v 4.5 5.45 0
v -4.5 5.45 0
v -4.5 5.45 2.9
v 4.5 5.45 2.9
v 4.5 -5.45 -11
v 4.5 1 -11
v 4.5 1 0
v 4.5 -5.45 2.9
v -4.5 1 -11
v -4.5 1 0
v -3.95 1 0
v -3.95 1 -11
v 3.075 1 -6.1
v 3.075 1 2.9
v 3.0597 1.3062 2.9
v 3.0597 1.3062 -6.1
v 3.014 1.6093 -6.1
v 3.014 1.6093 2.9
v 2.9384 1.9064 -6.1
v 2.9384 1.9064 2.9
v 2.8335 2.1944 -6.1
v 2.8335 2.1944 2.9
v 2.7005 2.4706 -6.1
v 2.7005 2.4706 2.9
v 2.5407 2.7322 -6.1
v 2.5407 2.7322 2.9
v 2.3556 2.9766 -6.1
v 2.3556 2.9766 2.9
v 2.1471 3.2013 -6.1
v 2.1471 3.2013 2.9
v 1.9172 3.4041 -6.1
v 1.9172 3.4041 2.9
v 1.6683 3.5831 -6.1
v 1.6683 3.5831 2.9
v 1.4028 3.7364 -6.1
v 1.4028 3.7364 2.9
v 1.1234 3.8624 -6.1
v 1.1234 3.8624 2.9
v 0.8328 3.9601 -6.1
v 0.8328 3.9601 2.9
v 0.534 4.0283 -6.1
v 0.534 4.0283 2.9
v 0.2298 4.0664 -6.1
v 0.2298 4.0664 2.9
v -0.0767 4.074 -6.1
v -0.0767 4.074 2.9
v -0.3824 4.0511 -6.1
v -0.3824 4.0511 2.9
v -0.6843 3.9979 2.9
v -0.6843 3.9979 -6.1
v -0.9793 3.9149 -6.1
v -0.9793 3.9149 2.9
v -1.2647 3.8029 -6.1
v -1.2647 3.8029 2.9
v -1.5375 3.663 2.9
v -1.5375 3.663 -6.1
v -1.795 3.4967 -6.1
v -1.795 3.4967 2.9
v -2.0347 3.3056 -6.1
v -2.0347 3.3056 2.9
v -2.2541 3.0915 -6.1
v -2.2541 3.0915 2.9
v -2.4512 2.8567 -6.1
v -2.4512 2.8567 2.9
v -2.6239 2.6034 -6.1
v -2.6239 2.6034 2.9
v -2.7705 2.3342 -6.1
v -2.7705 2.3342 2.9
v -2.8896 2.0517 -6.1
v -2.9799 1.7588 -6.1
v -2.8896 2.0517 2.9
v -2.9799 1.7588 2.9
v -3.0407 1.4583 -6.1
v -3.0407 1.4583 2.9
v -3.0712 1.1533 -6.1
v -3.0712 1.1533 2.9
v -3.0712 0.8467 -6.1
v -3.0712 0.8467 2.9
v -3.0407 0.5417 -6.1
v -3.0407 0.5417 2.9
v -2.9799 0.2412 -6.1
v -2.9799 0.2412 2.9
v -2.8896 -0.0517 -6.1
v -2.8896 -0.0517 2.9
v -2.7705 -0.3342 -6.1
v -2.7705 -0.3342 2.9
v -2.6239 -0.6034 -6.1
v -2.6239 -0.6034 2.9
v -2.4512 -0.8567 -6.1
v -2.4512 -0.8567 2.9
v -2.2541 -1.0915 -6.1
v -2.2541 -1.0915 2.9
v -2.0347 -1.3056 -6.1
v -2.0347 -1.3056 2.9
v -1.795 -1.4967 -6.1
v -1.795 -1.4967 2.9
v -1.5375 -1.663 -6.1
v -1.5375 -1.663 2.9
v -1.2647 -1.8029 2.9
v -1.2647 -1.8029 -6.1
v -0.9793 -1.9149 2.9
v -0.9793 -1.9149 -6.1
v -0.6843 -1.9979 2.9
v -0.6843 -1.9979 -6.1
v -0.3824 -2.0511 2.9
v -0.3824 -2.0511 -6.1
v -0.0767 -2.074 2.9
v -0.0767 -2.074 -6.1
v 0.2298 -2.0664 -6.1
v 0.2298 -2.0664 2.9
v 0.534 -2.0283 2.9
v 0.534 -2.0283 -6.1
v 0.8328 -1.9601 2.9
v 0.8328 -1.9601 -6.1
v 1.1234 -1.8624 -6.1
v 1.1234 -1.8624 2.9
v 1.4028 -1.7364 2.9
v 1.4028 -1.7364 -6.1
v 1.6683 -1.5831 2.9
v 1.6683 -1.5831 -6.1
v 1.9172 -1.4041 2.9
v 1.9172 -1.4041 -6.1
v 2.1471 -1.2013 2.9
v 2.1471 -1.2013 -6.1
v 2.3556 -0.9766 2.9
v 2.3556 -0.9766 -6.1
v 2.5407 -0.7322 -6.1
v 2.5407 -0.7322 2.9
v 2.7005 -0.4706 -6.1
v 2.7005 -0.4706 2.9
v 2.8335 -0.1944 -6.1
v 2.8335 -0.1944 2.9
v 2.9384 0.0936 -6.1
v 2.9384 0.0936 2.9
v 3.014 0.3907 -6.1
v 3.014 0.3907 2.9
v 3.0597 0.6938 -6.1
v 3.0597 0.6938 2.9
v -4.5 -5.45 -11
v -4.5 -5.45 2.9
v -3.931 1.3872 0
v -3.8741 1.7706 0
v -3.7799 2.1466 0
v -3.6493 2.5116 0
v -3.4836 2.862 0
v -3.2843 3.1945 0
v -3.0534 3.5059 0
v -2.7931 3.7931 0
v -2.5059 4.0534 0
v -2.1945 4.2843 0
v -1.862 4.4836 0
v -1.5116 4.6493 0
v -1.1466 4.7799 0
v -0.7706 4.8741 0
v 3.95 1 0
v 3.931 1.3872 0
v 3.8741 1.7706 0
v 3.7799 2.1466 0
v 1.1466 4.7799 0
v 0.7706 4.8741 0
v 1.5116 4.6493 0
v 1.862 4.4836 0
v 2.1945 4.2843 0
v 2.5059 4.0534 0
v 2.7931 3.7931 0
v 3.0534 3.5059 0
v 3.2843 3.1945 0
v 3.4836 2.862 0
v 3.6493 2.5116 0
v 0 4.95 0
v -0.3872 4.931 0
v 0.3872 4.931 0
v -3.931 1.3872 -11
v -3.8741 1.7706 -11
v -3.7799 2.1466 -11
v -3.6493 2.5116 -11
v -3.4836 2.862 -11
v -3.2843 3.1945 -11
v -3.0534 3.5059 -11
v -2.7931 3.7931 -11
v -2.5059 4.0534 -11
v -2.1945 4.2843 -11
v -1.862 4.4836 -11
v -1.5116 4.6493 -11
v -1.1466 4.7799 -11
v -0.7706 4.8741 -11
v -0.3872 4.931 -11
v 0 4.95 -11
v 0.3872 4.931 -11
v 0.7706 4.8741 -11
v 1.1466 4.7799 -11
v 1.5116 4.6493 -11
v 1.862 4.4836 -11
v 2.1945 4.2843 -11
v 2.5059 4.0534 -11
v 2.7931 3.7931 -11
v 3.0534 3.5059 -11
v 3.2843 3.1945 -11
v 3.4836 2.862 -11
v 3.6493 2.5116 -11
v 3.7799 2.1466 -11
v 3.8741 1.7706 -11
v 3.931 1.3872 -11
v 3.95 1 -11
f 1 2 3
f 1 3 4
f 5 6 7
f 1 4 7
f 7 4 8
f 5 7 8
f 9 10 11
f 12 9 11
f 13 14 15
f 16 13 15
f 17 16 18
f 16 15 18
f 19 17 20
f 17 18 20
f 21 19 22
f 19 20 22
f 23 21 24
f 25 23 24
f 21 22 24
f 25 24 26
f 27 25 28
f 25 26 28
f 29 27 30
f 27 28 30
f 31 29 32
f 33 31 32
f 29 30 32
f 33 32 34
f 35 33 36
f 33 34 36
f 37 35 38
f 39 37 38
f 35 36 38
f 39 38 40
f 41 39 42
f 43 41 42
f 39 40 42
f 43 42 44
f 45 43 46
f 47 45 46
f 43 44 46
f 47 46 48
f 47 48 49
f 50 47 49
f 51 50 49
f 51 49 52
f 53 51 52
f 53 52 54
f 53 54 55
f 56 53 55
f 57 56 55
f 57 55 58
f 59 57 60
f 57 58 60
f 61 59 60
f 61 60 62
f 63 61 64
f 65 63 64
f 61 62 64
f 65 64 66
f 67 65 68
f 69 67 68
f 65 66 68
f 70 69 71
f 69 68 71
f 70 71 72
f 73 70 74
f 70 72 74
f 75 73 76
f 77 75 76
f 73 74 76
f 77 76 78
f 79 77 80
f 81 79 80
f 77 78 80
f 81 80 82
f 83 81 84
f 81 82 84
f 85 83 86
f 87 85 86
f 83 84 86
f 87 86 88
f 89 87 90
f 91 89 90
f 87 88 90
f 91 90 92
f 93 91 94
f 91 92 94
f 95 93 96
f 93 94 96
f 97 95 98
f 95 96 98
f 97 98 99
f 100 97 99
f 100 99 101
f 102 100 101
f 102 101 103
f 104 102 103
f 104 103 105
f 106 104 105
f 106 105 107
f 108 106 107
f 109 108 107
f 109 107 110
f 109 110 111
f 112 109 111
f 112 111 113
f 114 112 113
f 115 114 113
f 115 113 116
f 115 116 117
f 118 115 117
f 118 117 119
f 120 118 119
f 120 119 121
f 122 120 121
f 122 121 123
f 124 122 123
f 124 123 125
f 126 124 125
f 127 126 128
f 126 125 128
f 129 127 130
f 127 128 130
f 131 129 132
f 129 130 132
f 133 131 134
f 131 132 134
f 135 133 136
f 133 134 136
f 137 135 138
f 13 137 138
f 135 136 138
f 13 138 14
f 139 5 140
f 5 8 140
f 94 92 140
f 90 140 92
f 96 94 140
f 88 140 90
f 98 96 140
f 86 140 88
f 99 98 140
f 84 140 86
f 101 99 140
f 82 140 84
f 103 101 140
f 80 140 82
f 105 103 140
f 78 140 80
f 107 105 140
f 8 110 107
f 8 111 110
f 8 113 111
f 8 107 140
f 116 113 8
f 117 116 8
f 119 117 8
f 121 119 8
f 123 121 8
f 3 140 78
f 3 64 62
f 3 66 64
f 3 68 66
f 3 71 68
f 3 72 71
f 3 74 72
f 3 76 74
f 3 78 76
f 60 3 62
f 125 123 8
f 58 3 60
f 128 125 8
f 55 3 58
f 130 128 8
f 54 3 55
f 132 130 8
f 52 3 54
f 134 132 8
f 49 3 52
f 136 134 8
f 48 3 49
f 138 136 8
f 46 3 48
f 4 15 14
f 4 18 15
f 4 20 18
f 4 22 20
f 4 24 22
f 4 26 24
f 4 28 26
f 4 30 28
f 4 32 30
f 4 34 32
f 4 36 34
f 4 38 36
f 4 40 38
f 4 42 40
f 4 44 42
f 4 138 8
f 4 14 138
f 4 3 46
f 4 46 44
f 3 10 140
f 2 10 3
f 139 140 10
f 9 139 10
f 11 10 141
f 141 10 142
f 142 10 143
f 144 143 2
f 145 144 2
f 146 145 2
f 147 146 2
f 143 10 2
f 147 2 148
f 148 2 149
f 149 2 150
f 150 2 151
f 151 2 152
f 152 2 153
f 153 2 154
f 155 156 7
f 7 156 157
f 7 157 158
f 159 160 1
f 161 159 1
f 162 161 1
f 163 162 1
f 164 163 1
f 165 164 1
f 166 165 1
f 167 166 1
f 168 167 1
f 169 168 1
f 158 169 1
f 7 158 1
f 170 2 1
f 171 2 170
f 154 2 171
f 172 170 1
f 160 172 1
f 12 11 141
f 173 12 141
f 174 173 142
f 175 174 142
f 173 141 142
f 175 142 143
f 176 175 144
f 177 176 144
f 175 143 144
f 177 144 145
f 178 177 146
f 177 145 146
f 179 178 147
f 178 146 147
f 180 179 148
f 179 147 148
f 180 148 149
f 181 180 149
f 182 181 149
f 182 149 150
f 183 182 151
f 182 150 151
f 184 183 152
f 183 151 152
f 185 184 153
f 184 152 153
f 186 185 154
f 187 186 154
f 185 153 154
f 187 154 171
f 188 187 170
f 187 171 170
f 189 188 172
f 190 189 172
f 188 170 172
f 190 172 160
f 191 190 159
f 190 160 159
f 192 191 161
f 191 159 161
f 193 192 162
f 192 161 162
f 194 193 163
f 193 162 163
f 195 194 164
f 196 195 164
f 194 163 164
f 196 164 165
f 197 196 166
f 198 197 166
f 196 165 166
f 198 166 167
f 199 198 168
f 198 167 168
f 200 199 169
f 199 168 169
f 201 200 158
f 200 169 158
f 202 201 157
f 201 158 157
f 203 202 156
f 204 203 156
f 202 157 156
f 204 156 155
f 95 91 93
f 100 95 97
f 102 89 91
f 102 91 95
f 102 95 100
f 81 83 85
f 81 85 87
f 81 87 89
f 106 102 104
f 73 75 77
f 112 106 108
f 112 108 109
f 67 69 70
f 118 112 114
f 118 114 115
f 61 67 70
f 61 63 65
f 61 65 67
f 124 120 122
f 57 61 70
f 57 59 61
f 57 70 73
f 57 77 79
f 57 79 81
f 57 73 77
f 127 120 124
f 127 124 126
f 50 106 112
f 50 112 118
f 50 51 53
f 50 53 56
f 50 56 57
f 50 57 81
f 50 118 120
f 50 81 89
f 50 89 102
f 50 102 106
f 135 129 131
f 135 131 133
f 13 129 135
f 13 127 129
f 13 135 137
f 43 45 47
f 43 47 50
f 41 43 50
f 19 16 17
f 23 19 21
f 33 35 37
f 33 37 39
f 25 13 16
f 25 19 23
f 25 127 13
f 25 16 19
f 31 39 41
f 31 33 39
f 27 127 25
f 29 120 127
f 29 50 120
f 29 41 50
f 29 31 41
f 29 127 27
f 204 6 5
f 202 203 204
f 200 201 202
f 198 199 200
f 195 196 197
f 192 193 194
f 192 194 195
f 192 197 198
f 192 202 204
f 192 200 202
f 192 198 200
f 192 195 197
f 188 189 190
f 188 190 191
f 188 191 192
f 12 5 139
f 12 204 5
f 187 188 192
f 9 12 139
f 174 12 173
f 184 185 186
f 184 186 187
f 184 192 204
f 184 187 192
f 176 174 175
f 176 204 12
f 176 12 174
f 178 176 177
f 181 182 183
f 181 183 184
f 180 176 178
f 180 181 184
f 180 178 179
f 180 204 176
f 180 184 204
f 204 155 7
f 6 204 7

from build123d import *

# Parameters (mm, degrees)
SKETCH1_W           = 9
SKETCH1_H           = 10.9
BOSS_EXTRUDE1_DEPTH = 2.9
BOSS_EXTRUDE2_DEPTH = 11
SKETCH3_R           = 3.075
CUT_EXTRUDE1_DEPTH  = 9


with BuildPart() as part:
    # Sketch1 → Boss-Extrude1 (new body)
    with BuildSketch(Plane.XY):
        Rectangle(SKETCH1_W, SKETCH1_H)
    extrude(amount=BOSS_EXTRUDE1_DEPTH)

    # Sketch2 → Boss-Extrude2 (add)
    with BuildSketch(Plane(origin=(0, 0, 0), x_dir=(-1, 0, 0), z_dir=(0, 0, -1))):
        with BuildLine():
            Line((-3.95, 1), (-4.5, 1))
            Line((-4.5, 1), (-4.5, -5.45))
            Line((-4.5, -5.45), (4.5, -5.45))
            Line((4.5, -5.45), (4.5, 1))
            Line((4.5, 1), (3.95, 1))
            ThreePointArc((3.95, 1), (0, 4.95), (-3.95, 1))
        make_face()
    extrude(amount=BOSS_EXTRUDE2_DEPTH)

    # Sketch3 → Cut-Extrude1 (cut)
    with BuildSketch(Plane.XY.offset(2.9)):
        with Locations((0, 1)):
            Circle(SKETCH3_R)
    extrude(amount=-CUT_EXTRUDE1_DEPTH, mode=Mode.SUBTRACT)


solid = part.part
